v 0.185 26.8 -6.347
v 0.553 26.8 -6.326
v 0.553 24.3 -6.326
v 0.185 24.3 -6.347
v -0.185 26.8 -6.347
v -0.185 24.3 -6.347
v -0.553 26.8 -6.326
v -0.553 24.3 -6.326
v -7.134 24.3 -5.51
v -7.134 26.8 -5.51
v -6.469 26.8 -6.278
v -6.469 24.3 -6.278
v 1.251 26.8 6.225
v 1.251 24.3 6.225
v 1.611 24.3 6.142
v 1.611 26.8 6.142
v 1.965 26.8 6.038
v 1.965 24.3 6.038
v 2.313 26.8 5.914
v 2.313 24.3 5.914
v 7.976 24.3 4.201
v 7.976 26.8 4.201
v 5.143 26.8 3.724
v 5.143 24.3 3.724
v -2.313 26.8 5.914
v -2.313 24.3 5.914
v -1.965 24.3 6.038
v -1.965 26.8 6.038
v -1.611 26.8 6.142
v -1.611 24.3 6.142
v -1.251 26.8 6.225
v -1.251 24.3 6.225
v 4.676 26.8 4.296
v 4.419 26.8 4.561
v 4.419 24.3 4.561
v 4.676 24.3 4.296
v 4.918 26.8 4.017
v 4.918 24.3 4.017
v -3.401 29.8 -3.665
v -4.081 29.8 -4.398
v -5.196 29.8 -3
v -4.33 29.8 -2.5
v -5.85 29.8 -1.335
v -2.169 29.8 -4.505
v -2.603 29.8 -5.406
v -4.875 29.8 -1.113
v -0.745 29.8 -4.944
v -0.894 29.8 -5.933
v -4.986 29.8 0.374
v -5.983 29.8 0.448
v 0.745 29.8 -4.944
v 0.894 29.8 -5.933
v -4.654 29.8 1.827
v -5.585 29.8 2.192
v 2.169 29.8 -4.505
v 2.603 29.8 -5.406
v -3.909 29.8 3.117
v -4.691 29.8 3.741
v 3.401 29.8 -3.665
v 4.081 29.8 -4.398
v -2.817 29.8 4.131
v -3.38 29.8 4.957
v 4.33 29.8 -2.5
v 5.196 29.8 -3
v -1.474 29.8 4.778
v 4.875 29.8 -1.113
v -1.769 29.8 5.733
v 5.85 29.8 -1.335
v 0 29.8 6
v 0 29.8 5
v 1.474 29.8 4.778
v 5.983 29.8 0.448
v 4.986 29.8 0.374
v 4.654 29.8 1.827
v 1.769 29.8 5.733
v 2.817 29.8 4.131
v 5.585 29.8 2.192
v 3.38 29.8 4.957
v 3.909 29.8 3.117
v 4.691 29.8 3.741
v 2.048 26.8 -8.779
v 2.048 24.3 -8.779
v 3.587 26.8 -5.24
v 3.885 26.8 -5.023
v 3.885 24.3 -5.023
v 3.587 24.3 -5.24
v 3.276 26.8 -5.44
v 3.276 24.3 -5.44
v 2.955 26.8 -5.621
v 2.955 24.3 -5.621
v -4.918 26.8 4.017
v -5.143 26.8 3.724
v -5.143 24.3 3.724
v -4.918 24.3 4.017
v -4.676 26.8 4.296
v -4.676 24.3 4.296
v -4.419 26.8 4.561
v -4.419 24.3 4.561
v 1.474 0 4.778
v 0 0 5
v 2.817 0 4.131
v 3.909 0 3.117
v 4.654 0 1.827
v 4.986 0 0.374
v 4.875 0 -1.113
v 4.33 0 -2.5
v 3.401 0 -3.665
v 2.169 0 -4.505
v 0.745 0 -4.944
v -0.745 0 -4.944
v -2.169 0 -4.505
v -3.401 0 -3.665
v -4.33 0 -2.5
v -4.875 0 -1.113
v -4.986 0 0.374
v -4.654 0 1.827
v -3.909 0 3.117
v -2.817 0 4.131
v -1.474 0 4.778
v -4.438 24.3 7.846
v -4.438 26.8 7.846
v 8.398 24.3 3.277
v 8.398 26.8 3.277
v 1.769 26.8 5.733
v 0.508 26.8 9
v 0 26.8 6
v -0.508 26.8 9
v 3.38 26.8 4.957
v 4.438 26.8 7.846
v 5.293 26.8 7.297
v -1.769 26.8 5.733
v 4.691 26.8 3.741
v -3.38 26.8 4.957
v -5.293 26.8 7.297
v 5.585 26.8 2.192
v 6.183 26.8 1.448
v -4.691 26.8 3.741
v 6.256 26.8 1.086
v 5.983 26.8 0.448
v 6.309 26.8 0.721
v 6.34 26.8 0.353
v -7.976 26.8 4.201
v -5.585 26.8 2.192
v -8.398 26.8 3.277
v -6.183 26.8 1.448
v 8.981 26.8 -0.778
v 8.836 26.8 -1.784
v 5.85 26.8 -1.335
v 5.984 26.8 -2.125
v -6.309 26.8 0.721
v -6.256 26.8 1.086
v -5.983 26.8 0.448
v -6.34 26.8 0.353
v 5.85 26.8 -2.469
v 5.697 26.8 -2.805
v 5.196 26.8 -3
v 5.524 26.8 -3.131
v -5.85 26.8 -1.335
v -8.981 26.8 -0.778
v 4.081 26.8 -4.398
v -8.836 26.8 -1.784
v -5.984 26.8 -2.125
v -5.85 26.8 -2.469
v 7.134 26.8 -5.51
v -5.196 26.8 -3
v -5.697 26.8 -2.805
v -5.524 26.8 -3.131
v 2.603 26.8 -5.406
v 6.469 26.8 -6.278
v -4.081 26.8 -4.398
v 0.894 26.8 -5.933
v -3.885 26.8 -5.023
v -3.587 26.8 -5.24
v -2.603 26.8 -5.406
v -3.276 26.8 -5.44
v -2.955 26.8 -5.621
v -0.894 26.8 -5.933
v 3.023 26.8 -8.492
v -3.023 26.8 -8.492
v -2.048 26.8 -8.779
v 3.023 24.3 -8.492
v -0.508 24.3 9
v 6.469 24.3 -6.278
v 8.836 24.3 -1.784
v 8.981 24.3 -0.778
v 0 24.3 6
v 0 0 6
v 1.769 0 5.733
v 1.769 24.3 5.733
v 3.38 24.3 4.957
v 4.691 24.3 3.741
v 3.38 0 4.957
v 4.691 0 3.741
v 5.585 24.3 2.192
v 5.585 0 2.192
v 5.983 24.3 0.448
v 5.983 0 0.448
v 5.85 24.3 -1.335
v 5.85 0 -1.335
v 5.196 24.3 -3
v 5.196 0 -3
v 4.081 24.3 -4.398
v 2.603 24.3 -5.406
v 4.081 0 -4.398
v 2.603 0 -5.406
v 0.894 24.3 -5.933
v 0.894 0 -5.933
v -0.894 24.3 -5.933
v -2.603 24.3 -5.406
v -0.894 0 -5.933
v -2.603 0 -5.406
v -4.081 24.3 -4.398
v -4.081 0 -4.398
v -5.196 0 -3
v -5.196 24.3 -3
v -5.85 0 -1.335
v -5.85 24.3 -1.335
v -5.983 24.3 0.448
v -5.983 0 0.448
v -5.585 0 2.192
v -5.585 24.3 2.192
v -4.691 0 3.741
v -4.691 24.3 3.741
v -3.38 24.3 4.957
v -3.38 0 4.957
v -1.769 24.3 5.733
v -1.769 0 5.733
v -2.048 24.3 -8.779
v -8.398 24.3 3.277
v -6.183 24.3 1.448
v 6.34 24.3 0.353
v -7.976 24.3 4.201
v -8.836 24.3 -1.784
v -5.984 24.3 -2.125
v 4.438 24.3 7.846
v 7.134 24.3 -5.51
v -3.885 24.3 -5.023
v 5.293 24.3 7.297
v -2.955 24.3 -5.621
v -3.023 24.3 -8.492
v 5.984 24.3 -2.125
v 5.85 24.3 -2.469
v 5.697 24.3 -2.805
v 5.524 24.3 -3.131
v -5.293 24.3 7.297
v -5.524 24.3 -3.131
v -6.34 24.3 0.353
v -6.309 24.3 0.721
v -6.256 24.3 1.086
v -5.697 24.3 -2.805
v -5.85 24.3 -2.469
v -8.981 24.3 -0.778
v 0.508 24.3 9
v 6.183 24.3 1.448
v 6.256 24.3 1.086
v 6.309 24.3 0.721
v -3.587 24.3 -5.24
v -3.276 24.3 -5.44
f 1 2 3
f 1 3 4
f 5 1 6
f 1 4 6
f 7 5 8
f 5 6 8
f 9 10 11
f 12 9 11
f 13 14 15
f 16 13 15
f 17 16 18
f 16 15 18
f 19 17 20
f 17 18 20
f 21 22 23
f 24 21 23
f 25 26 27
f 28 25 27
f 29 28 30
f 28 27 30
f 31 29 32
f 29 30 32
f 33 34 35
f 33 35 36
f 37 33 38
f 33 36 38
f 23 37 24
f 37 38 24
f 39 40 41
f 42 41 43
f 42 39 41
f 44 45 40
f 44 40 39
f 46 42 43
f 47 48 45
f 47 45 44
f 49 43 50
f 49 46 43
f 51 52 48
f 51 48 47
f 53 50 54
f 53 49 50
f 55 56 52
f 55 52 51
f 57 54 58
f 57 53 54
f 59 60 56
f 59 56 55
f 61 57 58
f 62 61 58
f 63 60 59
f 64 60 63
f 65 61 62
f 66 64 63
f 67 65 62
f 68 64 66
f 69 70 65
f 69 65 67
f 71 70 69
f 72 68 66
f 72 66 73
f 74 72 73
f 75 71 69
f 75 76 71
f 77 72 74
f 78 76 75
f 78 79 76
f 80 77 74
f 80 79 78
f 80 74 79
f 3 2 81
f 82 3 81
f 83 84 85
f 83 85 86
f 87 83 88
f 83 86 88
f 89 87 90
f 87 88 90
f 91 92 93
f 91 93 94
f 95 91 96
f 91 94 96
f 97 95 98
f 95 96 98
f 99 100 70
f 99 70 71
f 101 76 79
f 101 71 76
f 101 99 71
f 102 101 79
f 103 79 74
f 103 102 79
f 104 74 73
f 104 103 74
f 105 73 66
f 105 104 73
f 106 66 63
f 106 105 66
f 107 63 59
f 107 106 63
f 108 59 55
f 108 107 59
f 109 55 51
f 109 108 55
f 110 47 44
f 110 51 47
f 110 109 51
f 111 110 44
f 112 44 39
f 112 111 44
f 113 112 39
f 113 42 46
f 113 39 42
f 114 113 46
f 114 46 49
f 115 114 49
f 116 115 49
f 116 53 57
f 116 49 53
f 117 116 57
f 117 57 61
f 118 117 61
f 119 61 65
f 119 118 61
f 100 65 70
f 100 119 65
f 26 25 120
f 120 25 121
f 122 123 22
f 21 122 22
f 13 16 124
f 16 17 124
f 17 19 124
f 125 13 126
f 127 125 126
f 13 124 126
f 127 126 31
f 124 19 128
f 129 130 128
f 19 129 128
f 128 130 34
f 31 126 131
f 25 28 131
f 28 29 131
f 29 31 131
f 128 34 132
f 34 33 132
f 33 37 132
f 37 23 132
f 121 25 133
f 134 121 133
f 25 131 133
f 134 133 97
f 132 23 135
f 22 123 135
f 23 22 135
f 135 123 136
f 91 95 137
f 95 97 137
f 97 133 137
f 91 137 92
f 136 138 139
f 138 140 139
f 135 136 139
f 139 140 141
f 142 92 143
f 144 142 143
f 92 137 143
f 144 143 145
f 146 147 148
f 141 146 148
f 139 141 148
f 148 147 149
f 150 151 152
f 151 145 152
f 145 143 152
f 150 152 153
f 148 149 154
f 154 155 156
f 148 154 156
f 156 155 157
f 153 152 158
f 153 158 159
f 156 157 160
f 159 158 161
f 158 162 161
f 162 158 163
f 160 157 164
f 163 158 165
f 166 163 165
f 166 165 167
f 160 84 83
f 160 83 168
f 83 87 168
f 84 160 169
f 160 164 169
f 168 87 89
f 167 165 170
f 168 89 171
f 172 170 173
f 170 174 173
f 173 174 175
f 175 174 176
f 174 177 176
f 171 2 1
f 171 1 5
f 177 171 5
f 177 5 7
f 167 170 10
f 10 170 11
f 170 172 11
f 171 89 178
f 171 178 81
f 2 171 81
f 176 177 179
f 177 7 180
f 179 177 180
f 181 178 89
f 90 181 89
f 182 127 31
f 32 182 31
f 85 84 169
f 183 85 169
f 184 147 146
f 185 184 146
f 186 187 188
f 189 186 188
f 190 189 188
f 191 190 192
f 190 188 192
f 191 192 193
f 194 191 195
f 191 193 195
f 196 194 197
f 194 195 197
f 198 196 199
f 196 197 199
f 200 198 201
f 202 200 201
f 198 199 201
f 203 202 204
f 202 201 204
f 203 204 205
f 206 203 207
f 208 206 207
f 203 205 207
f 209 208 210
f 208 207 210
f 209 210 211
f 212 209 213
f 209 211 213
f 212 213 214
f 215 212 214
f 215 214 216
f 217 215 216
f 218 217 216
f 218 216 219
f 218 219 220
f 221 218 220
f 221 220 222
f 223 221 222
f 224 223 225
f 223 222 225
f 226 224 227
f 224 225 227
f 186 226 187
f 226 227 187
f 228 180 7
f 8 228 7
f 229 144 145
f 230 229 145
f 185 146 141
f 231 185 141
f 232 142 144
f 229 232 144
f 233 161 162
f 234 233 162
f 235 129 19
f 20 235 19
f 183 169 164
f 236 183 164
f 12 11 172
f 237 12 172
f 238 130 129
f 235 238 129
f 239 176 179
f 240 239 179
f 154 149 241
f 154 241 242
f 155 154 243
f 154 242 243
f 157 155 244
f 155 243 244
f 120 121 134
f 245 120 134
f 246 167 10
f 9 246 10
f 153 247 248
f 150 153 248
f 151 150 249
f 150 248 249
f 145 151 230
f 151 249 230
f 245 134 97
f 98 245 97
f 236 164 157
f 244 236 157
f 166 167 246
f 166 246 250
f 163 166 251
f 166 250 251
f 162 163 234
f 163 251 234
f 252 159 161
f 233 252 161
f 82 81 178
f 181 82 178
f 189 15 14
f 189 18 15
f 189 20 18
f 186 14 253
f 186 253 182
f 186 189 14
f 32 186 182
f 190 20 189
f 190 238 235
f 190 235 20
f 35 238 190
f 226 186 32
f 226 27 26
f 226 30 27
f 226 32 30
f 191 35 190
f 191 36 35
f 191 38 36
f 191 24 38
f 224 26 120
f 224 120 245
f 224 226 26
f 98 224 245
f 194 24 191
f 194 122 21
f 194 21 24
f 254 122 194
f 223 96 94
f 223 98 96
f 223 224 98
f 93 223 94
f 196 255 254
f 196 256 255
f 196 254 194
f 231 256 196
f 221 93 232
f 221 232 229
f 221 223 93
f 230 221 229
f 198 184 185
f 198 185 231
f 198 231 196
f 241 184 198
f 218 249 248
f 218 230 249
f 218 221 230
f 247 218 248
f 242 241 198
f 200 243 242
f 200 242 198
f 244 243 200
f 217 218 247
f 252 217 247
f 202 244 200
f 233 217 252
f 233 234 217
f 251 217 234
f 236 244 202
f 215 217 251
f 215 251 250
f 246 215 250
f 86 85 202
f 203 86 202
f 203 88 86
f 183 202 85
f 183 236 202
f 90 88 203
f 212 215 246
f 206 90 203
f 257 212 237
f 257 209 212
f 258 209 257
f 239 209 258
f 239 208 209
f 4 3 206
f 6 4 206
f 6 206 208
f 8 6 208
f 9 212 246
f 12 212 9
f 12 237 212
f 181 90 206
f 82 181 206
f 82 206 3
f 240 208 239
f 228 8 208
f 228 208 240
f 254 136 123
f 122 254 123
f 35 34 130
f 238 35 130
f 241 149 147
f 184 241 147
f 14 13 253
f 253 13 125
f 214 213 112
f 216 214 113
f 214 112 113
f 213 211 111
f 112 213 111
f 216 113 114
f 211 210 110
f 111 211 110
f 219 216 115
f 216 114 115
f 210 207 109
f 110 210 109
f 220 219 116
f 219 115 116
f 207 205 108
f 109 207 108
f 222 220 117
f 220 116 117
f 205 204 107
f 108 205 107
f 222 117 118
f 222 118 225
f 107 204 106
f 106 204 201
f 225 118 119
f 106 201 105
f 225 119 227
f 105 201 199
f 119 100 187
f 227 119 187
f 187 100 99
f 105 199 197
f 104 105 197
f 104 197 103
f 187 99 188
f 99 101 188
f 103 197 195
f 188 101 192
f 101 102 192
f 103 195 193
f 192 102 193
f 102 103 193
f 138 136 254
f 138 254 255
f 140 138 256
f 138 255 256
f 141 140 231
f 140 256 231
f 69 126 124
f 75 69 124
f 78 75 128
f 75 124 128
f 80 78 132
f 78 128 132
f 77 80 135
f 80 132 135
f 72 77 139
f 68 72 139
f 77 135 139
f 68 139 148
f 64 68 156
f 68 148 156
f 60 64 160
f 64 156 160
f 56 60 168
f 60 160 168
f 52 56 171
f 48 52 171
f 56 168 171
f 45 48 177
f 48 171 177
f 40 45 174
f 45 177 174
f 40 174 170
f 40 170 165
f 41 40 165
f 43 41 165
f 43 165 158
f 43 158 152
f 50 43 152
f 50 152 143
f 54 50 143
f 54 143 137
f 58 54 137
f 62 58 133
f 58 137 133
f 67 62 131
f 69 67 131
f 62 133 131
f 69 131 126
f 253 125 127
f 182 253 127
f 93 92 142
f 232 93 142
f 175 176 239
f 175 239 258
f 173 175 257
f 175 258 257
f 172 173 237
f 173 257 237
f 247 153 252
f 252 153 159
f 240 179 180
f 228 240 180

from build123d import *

# Parameters (mm, degrees)
SKETCH1_R               = 6
BOSS_EXTRUDE1_DEPTH     = 24.3
SKETCH8_R               = 6.35
BOSS_EXTRUDE5_DEPTH     = 2.5
BOSS_EXTRUDE6_DEPTH     = 2.5
CIRPATTERN1_COUNT       = 11
SKETCH10_R              = 6
BOSS_EXTRUDE7_DEPTH     = 3
CUT_EXTRUDE3_DEPTH      = 33.398962536
CUT_EXTRUDE3_DEPTH_BACK = 33.398962536
SKETCH11_R              = 5


with BuildPart() as part:
    # Sketch1 → Boss-Extrude1 (new body)
    with BuildSketch(Plane(origin=(0, 0, 0), x_dir=(1, 0, 0), z_dir=(0, 1, 0))):
        with Locations(Location((0, 0, 0), (0, 0, 270))):
            Circle(SKETCH1_R)
    extrude(amount=BOSS_EXTRUDE1_DEPTH)

    # Sketch8 → Boss-Extrude5 (add)
    with BuildSketch(Plane(origin=(0, 24.3, 0), x_dir=(-1, 0, 0), z_dir=(0, 1, 0))):
        with Locations(Location((0, 0, 0), (0, 0, 90))):
            Circle(SKETCH8_R)
    extrude(amount=BOSS_EXTRUDE5_DEPTH)

    # Sketch9 → Boss-Extrude6 (add)
    with BuildSketch(Plane(origin=(0, 26.8, 0), x_dir=(1, 0, 0), z_dir=(0, 1, 0))):
        Polygon((0.508, -9), (-0.508, -9), (-1.286124455, -6.096), (1.286124455, -6.096), align=None)
    boss_extrude6 = extrude(amount=-BOSS_EXTRUDE6_DEPTH)

    # CirPattern1: Boss-Extrude6 ×11 about axis
    cirpattern1_axis = Axis((0, 0, 0), (0, 1, 0))
    for i in range(1, CIRPATTERN1_COUNT):
        add(boss_extrude6.rotate(cirpattern1_axis, i * 360 / CIRPATTERN1_COUNT))

    # Sketch10 → Boss-Extrude7 (add)
    with BuildSketch(Plane(origin=(0, 26.8, 0), x_dir=(1, 0, 0), z_dir=(0, 1, 0))):
        with Locations(Location((0, 0, 0), (0, 0, 270))):
            Circle(SKETCH10_R)
    extrude(amount=BOSS_EXTRUDE7_DEPTH)

    # Sketch11 → Cut-Extrude3 (cut, two sides: drawn at the far end of the back side and taken through both)
    with BuildSketch(Plane(origin=(0, 29.8, 0), x_dir=(-1, 0, 0), z_dir=(0, 1, 0)).offset(-CUT_EXTRUDE3_DEPTH_BACK)):
        with Locations(Location((0, 0, 0), (0, 0, 90))):
            Circle(SKETCH11_R)
    extrude(amount=CUT_EXTRUDE3_DEPTH + CUT_EXTRUDE3_DEPTH_BACK, mode=Mode.SUBTRACT)


solid = part.part
